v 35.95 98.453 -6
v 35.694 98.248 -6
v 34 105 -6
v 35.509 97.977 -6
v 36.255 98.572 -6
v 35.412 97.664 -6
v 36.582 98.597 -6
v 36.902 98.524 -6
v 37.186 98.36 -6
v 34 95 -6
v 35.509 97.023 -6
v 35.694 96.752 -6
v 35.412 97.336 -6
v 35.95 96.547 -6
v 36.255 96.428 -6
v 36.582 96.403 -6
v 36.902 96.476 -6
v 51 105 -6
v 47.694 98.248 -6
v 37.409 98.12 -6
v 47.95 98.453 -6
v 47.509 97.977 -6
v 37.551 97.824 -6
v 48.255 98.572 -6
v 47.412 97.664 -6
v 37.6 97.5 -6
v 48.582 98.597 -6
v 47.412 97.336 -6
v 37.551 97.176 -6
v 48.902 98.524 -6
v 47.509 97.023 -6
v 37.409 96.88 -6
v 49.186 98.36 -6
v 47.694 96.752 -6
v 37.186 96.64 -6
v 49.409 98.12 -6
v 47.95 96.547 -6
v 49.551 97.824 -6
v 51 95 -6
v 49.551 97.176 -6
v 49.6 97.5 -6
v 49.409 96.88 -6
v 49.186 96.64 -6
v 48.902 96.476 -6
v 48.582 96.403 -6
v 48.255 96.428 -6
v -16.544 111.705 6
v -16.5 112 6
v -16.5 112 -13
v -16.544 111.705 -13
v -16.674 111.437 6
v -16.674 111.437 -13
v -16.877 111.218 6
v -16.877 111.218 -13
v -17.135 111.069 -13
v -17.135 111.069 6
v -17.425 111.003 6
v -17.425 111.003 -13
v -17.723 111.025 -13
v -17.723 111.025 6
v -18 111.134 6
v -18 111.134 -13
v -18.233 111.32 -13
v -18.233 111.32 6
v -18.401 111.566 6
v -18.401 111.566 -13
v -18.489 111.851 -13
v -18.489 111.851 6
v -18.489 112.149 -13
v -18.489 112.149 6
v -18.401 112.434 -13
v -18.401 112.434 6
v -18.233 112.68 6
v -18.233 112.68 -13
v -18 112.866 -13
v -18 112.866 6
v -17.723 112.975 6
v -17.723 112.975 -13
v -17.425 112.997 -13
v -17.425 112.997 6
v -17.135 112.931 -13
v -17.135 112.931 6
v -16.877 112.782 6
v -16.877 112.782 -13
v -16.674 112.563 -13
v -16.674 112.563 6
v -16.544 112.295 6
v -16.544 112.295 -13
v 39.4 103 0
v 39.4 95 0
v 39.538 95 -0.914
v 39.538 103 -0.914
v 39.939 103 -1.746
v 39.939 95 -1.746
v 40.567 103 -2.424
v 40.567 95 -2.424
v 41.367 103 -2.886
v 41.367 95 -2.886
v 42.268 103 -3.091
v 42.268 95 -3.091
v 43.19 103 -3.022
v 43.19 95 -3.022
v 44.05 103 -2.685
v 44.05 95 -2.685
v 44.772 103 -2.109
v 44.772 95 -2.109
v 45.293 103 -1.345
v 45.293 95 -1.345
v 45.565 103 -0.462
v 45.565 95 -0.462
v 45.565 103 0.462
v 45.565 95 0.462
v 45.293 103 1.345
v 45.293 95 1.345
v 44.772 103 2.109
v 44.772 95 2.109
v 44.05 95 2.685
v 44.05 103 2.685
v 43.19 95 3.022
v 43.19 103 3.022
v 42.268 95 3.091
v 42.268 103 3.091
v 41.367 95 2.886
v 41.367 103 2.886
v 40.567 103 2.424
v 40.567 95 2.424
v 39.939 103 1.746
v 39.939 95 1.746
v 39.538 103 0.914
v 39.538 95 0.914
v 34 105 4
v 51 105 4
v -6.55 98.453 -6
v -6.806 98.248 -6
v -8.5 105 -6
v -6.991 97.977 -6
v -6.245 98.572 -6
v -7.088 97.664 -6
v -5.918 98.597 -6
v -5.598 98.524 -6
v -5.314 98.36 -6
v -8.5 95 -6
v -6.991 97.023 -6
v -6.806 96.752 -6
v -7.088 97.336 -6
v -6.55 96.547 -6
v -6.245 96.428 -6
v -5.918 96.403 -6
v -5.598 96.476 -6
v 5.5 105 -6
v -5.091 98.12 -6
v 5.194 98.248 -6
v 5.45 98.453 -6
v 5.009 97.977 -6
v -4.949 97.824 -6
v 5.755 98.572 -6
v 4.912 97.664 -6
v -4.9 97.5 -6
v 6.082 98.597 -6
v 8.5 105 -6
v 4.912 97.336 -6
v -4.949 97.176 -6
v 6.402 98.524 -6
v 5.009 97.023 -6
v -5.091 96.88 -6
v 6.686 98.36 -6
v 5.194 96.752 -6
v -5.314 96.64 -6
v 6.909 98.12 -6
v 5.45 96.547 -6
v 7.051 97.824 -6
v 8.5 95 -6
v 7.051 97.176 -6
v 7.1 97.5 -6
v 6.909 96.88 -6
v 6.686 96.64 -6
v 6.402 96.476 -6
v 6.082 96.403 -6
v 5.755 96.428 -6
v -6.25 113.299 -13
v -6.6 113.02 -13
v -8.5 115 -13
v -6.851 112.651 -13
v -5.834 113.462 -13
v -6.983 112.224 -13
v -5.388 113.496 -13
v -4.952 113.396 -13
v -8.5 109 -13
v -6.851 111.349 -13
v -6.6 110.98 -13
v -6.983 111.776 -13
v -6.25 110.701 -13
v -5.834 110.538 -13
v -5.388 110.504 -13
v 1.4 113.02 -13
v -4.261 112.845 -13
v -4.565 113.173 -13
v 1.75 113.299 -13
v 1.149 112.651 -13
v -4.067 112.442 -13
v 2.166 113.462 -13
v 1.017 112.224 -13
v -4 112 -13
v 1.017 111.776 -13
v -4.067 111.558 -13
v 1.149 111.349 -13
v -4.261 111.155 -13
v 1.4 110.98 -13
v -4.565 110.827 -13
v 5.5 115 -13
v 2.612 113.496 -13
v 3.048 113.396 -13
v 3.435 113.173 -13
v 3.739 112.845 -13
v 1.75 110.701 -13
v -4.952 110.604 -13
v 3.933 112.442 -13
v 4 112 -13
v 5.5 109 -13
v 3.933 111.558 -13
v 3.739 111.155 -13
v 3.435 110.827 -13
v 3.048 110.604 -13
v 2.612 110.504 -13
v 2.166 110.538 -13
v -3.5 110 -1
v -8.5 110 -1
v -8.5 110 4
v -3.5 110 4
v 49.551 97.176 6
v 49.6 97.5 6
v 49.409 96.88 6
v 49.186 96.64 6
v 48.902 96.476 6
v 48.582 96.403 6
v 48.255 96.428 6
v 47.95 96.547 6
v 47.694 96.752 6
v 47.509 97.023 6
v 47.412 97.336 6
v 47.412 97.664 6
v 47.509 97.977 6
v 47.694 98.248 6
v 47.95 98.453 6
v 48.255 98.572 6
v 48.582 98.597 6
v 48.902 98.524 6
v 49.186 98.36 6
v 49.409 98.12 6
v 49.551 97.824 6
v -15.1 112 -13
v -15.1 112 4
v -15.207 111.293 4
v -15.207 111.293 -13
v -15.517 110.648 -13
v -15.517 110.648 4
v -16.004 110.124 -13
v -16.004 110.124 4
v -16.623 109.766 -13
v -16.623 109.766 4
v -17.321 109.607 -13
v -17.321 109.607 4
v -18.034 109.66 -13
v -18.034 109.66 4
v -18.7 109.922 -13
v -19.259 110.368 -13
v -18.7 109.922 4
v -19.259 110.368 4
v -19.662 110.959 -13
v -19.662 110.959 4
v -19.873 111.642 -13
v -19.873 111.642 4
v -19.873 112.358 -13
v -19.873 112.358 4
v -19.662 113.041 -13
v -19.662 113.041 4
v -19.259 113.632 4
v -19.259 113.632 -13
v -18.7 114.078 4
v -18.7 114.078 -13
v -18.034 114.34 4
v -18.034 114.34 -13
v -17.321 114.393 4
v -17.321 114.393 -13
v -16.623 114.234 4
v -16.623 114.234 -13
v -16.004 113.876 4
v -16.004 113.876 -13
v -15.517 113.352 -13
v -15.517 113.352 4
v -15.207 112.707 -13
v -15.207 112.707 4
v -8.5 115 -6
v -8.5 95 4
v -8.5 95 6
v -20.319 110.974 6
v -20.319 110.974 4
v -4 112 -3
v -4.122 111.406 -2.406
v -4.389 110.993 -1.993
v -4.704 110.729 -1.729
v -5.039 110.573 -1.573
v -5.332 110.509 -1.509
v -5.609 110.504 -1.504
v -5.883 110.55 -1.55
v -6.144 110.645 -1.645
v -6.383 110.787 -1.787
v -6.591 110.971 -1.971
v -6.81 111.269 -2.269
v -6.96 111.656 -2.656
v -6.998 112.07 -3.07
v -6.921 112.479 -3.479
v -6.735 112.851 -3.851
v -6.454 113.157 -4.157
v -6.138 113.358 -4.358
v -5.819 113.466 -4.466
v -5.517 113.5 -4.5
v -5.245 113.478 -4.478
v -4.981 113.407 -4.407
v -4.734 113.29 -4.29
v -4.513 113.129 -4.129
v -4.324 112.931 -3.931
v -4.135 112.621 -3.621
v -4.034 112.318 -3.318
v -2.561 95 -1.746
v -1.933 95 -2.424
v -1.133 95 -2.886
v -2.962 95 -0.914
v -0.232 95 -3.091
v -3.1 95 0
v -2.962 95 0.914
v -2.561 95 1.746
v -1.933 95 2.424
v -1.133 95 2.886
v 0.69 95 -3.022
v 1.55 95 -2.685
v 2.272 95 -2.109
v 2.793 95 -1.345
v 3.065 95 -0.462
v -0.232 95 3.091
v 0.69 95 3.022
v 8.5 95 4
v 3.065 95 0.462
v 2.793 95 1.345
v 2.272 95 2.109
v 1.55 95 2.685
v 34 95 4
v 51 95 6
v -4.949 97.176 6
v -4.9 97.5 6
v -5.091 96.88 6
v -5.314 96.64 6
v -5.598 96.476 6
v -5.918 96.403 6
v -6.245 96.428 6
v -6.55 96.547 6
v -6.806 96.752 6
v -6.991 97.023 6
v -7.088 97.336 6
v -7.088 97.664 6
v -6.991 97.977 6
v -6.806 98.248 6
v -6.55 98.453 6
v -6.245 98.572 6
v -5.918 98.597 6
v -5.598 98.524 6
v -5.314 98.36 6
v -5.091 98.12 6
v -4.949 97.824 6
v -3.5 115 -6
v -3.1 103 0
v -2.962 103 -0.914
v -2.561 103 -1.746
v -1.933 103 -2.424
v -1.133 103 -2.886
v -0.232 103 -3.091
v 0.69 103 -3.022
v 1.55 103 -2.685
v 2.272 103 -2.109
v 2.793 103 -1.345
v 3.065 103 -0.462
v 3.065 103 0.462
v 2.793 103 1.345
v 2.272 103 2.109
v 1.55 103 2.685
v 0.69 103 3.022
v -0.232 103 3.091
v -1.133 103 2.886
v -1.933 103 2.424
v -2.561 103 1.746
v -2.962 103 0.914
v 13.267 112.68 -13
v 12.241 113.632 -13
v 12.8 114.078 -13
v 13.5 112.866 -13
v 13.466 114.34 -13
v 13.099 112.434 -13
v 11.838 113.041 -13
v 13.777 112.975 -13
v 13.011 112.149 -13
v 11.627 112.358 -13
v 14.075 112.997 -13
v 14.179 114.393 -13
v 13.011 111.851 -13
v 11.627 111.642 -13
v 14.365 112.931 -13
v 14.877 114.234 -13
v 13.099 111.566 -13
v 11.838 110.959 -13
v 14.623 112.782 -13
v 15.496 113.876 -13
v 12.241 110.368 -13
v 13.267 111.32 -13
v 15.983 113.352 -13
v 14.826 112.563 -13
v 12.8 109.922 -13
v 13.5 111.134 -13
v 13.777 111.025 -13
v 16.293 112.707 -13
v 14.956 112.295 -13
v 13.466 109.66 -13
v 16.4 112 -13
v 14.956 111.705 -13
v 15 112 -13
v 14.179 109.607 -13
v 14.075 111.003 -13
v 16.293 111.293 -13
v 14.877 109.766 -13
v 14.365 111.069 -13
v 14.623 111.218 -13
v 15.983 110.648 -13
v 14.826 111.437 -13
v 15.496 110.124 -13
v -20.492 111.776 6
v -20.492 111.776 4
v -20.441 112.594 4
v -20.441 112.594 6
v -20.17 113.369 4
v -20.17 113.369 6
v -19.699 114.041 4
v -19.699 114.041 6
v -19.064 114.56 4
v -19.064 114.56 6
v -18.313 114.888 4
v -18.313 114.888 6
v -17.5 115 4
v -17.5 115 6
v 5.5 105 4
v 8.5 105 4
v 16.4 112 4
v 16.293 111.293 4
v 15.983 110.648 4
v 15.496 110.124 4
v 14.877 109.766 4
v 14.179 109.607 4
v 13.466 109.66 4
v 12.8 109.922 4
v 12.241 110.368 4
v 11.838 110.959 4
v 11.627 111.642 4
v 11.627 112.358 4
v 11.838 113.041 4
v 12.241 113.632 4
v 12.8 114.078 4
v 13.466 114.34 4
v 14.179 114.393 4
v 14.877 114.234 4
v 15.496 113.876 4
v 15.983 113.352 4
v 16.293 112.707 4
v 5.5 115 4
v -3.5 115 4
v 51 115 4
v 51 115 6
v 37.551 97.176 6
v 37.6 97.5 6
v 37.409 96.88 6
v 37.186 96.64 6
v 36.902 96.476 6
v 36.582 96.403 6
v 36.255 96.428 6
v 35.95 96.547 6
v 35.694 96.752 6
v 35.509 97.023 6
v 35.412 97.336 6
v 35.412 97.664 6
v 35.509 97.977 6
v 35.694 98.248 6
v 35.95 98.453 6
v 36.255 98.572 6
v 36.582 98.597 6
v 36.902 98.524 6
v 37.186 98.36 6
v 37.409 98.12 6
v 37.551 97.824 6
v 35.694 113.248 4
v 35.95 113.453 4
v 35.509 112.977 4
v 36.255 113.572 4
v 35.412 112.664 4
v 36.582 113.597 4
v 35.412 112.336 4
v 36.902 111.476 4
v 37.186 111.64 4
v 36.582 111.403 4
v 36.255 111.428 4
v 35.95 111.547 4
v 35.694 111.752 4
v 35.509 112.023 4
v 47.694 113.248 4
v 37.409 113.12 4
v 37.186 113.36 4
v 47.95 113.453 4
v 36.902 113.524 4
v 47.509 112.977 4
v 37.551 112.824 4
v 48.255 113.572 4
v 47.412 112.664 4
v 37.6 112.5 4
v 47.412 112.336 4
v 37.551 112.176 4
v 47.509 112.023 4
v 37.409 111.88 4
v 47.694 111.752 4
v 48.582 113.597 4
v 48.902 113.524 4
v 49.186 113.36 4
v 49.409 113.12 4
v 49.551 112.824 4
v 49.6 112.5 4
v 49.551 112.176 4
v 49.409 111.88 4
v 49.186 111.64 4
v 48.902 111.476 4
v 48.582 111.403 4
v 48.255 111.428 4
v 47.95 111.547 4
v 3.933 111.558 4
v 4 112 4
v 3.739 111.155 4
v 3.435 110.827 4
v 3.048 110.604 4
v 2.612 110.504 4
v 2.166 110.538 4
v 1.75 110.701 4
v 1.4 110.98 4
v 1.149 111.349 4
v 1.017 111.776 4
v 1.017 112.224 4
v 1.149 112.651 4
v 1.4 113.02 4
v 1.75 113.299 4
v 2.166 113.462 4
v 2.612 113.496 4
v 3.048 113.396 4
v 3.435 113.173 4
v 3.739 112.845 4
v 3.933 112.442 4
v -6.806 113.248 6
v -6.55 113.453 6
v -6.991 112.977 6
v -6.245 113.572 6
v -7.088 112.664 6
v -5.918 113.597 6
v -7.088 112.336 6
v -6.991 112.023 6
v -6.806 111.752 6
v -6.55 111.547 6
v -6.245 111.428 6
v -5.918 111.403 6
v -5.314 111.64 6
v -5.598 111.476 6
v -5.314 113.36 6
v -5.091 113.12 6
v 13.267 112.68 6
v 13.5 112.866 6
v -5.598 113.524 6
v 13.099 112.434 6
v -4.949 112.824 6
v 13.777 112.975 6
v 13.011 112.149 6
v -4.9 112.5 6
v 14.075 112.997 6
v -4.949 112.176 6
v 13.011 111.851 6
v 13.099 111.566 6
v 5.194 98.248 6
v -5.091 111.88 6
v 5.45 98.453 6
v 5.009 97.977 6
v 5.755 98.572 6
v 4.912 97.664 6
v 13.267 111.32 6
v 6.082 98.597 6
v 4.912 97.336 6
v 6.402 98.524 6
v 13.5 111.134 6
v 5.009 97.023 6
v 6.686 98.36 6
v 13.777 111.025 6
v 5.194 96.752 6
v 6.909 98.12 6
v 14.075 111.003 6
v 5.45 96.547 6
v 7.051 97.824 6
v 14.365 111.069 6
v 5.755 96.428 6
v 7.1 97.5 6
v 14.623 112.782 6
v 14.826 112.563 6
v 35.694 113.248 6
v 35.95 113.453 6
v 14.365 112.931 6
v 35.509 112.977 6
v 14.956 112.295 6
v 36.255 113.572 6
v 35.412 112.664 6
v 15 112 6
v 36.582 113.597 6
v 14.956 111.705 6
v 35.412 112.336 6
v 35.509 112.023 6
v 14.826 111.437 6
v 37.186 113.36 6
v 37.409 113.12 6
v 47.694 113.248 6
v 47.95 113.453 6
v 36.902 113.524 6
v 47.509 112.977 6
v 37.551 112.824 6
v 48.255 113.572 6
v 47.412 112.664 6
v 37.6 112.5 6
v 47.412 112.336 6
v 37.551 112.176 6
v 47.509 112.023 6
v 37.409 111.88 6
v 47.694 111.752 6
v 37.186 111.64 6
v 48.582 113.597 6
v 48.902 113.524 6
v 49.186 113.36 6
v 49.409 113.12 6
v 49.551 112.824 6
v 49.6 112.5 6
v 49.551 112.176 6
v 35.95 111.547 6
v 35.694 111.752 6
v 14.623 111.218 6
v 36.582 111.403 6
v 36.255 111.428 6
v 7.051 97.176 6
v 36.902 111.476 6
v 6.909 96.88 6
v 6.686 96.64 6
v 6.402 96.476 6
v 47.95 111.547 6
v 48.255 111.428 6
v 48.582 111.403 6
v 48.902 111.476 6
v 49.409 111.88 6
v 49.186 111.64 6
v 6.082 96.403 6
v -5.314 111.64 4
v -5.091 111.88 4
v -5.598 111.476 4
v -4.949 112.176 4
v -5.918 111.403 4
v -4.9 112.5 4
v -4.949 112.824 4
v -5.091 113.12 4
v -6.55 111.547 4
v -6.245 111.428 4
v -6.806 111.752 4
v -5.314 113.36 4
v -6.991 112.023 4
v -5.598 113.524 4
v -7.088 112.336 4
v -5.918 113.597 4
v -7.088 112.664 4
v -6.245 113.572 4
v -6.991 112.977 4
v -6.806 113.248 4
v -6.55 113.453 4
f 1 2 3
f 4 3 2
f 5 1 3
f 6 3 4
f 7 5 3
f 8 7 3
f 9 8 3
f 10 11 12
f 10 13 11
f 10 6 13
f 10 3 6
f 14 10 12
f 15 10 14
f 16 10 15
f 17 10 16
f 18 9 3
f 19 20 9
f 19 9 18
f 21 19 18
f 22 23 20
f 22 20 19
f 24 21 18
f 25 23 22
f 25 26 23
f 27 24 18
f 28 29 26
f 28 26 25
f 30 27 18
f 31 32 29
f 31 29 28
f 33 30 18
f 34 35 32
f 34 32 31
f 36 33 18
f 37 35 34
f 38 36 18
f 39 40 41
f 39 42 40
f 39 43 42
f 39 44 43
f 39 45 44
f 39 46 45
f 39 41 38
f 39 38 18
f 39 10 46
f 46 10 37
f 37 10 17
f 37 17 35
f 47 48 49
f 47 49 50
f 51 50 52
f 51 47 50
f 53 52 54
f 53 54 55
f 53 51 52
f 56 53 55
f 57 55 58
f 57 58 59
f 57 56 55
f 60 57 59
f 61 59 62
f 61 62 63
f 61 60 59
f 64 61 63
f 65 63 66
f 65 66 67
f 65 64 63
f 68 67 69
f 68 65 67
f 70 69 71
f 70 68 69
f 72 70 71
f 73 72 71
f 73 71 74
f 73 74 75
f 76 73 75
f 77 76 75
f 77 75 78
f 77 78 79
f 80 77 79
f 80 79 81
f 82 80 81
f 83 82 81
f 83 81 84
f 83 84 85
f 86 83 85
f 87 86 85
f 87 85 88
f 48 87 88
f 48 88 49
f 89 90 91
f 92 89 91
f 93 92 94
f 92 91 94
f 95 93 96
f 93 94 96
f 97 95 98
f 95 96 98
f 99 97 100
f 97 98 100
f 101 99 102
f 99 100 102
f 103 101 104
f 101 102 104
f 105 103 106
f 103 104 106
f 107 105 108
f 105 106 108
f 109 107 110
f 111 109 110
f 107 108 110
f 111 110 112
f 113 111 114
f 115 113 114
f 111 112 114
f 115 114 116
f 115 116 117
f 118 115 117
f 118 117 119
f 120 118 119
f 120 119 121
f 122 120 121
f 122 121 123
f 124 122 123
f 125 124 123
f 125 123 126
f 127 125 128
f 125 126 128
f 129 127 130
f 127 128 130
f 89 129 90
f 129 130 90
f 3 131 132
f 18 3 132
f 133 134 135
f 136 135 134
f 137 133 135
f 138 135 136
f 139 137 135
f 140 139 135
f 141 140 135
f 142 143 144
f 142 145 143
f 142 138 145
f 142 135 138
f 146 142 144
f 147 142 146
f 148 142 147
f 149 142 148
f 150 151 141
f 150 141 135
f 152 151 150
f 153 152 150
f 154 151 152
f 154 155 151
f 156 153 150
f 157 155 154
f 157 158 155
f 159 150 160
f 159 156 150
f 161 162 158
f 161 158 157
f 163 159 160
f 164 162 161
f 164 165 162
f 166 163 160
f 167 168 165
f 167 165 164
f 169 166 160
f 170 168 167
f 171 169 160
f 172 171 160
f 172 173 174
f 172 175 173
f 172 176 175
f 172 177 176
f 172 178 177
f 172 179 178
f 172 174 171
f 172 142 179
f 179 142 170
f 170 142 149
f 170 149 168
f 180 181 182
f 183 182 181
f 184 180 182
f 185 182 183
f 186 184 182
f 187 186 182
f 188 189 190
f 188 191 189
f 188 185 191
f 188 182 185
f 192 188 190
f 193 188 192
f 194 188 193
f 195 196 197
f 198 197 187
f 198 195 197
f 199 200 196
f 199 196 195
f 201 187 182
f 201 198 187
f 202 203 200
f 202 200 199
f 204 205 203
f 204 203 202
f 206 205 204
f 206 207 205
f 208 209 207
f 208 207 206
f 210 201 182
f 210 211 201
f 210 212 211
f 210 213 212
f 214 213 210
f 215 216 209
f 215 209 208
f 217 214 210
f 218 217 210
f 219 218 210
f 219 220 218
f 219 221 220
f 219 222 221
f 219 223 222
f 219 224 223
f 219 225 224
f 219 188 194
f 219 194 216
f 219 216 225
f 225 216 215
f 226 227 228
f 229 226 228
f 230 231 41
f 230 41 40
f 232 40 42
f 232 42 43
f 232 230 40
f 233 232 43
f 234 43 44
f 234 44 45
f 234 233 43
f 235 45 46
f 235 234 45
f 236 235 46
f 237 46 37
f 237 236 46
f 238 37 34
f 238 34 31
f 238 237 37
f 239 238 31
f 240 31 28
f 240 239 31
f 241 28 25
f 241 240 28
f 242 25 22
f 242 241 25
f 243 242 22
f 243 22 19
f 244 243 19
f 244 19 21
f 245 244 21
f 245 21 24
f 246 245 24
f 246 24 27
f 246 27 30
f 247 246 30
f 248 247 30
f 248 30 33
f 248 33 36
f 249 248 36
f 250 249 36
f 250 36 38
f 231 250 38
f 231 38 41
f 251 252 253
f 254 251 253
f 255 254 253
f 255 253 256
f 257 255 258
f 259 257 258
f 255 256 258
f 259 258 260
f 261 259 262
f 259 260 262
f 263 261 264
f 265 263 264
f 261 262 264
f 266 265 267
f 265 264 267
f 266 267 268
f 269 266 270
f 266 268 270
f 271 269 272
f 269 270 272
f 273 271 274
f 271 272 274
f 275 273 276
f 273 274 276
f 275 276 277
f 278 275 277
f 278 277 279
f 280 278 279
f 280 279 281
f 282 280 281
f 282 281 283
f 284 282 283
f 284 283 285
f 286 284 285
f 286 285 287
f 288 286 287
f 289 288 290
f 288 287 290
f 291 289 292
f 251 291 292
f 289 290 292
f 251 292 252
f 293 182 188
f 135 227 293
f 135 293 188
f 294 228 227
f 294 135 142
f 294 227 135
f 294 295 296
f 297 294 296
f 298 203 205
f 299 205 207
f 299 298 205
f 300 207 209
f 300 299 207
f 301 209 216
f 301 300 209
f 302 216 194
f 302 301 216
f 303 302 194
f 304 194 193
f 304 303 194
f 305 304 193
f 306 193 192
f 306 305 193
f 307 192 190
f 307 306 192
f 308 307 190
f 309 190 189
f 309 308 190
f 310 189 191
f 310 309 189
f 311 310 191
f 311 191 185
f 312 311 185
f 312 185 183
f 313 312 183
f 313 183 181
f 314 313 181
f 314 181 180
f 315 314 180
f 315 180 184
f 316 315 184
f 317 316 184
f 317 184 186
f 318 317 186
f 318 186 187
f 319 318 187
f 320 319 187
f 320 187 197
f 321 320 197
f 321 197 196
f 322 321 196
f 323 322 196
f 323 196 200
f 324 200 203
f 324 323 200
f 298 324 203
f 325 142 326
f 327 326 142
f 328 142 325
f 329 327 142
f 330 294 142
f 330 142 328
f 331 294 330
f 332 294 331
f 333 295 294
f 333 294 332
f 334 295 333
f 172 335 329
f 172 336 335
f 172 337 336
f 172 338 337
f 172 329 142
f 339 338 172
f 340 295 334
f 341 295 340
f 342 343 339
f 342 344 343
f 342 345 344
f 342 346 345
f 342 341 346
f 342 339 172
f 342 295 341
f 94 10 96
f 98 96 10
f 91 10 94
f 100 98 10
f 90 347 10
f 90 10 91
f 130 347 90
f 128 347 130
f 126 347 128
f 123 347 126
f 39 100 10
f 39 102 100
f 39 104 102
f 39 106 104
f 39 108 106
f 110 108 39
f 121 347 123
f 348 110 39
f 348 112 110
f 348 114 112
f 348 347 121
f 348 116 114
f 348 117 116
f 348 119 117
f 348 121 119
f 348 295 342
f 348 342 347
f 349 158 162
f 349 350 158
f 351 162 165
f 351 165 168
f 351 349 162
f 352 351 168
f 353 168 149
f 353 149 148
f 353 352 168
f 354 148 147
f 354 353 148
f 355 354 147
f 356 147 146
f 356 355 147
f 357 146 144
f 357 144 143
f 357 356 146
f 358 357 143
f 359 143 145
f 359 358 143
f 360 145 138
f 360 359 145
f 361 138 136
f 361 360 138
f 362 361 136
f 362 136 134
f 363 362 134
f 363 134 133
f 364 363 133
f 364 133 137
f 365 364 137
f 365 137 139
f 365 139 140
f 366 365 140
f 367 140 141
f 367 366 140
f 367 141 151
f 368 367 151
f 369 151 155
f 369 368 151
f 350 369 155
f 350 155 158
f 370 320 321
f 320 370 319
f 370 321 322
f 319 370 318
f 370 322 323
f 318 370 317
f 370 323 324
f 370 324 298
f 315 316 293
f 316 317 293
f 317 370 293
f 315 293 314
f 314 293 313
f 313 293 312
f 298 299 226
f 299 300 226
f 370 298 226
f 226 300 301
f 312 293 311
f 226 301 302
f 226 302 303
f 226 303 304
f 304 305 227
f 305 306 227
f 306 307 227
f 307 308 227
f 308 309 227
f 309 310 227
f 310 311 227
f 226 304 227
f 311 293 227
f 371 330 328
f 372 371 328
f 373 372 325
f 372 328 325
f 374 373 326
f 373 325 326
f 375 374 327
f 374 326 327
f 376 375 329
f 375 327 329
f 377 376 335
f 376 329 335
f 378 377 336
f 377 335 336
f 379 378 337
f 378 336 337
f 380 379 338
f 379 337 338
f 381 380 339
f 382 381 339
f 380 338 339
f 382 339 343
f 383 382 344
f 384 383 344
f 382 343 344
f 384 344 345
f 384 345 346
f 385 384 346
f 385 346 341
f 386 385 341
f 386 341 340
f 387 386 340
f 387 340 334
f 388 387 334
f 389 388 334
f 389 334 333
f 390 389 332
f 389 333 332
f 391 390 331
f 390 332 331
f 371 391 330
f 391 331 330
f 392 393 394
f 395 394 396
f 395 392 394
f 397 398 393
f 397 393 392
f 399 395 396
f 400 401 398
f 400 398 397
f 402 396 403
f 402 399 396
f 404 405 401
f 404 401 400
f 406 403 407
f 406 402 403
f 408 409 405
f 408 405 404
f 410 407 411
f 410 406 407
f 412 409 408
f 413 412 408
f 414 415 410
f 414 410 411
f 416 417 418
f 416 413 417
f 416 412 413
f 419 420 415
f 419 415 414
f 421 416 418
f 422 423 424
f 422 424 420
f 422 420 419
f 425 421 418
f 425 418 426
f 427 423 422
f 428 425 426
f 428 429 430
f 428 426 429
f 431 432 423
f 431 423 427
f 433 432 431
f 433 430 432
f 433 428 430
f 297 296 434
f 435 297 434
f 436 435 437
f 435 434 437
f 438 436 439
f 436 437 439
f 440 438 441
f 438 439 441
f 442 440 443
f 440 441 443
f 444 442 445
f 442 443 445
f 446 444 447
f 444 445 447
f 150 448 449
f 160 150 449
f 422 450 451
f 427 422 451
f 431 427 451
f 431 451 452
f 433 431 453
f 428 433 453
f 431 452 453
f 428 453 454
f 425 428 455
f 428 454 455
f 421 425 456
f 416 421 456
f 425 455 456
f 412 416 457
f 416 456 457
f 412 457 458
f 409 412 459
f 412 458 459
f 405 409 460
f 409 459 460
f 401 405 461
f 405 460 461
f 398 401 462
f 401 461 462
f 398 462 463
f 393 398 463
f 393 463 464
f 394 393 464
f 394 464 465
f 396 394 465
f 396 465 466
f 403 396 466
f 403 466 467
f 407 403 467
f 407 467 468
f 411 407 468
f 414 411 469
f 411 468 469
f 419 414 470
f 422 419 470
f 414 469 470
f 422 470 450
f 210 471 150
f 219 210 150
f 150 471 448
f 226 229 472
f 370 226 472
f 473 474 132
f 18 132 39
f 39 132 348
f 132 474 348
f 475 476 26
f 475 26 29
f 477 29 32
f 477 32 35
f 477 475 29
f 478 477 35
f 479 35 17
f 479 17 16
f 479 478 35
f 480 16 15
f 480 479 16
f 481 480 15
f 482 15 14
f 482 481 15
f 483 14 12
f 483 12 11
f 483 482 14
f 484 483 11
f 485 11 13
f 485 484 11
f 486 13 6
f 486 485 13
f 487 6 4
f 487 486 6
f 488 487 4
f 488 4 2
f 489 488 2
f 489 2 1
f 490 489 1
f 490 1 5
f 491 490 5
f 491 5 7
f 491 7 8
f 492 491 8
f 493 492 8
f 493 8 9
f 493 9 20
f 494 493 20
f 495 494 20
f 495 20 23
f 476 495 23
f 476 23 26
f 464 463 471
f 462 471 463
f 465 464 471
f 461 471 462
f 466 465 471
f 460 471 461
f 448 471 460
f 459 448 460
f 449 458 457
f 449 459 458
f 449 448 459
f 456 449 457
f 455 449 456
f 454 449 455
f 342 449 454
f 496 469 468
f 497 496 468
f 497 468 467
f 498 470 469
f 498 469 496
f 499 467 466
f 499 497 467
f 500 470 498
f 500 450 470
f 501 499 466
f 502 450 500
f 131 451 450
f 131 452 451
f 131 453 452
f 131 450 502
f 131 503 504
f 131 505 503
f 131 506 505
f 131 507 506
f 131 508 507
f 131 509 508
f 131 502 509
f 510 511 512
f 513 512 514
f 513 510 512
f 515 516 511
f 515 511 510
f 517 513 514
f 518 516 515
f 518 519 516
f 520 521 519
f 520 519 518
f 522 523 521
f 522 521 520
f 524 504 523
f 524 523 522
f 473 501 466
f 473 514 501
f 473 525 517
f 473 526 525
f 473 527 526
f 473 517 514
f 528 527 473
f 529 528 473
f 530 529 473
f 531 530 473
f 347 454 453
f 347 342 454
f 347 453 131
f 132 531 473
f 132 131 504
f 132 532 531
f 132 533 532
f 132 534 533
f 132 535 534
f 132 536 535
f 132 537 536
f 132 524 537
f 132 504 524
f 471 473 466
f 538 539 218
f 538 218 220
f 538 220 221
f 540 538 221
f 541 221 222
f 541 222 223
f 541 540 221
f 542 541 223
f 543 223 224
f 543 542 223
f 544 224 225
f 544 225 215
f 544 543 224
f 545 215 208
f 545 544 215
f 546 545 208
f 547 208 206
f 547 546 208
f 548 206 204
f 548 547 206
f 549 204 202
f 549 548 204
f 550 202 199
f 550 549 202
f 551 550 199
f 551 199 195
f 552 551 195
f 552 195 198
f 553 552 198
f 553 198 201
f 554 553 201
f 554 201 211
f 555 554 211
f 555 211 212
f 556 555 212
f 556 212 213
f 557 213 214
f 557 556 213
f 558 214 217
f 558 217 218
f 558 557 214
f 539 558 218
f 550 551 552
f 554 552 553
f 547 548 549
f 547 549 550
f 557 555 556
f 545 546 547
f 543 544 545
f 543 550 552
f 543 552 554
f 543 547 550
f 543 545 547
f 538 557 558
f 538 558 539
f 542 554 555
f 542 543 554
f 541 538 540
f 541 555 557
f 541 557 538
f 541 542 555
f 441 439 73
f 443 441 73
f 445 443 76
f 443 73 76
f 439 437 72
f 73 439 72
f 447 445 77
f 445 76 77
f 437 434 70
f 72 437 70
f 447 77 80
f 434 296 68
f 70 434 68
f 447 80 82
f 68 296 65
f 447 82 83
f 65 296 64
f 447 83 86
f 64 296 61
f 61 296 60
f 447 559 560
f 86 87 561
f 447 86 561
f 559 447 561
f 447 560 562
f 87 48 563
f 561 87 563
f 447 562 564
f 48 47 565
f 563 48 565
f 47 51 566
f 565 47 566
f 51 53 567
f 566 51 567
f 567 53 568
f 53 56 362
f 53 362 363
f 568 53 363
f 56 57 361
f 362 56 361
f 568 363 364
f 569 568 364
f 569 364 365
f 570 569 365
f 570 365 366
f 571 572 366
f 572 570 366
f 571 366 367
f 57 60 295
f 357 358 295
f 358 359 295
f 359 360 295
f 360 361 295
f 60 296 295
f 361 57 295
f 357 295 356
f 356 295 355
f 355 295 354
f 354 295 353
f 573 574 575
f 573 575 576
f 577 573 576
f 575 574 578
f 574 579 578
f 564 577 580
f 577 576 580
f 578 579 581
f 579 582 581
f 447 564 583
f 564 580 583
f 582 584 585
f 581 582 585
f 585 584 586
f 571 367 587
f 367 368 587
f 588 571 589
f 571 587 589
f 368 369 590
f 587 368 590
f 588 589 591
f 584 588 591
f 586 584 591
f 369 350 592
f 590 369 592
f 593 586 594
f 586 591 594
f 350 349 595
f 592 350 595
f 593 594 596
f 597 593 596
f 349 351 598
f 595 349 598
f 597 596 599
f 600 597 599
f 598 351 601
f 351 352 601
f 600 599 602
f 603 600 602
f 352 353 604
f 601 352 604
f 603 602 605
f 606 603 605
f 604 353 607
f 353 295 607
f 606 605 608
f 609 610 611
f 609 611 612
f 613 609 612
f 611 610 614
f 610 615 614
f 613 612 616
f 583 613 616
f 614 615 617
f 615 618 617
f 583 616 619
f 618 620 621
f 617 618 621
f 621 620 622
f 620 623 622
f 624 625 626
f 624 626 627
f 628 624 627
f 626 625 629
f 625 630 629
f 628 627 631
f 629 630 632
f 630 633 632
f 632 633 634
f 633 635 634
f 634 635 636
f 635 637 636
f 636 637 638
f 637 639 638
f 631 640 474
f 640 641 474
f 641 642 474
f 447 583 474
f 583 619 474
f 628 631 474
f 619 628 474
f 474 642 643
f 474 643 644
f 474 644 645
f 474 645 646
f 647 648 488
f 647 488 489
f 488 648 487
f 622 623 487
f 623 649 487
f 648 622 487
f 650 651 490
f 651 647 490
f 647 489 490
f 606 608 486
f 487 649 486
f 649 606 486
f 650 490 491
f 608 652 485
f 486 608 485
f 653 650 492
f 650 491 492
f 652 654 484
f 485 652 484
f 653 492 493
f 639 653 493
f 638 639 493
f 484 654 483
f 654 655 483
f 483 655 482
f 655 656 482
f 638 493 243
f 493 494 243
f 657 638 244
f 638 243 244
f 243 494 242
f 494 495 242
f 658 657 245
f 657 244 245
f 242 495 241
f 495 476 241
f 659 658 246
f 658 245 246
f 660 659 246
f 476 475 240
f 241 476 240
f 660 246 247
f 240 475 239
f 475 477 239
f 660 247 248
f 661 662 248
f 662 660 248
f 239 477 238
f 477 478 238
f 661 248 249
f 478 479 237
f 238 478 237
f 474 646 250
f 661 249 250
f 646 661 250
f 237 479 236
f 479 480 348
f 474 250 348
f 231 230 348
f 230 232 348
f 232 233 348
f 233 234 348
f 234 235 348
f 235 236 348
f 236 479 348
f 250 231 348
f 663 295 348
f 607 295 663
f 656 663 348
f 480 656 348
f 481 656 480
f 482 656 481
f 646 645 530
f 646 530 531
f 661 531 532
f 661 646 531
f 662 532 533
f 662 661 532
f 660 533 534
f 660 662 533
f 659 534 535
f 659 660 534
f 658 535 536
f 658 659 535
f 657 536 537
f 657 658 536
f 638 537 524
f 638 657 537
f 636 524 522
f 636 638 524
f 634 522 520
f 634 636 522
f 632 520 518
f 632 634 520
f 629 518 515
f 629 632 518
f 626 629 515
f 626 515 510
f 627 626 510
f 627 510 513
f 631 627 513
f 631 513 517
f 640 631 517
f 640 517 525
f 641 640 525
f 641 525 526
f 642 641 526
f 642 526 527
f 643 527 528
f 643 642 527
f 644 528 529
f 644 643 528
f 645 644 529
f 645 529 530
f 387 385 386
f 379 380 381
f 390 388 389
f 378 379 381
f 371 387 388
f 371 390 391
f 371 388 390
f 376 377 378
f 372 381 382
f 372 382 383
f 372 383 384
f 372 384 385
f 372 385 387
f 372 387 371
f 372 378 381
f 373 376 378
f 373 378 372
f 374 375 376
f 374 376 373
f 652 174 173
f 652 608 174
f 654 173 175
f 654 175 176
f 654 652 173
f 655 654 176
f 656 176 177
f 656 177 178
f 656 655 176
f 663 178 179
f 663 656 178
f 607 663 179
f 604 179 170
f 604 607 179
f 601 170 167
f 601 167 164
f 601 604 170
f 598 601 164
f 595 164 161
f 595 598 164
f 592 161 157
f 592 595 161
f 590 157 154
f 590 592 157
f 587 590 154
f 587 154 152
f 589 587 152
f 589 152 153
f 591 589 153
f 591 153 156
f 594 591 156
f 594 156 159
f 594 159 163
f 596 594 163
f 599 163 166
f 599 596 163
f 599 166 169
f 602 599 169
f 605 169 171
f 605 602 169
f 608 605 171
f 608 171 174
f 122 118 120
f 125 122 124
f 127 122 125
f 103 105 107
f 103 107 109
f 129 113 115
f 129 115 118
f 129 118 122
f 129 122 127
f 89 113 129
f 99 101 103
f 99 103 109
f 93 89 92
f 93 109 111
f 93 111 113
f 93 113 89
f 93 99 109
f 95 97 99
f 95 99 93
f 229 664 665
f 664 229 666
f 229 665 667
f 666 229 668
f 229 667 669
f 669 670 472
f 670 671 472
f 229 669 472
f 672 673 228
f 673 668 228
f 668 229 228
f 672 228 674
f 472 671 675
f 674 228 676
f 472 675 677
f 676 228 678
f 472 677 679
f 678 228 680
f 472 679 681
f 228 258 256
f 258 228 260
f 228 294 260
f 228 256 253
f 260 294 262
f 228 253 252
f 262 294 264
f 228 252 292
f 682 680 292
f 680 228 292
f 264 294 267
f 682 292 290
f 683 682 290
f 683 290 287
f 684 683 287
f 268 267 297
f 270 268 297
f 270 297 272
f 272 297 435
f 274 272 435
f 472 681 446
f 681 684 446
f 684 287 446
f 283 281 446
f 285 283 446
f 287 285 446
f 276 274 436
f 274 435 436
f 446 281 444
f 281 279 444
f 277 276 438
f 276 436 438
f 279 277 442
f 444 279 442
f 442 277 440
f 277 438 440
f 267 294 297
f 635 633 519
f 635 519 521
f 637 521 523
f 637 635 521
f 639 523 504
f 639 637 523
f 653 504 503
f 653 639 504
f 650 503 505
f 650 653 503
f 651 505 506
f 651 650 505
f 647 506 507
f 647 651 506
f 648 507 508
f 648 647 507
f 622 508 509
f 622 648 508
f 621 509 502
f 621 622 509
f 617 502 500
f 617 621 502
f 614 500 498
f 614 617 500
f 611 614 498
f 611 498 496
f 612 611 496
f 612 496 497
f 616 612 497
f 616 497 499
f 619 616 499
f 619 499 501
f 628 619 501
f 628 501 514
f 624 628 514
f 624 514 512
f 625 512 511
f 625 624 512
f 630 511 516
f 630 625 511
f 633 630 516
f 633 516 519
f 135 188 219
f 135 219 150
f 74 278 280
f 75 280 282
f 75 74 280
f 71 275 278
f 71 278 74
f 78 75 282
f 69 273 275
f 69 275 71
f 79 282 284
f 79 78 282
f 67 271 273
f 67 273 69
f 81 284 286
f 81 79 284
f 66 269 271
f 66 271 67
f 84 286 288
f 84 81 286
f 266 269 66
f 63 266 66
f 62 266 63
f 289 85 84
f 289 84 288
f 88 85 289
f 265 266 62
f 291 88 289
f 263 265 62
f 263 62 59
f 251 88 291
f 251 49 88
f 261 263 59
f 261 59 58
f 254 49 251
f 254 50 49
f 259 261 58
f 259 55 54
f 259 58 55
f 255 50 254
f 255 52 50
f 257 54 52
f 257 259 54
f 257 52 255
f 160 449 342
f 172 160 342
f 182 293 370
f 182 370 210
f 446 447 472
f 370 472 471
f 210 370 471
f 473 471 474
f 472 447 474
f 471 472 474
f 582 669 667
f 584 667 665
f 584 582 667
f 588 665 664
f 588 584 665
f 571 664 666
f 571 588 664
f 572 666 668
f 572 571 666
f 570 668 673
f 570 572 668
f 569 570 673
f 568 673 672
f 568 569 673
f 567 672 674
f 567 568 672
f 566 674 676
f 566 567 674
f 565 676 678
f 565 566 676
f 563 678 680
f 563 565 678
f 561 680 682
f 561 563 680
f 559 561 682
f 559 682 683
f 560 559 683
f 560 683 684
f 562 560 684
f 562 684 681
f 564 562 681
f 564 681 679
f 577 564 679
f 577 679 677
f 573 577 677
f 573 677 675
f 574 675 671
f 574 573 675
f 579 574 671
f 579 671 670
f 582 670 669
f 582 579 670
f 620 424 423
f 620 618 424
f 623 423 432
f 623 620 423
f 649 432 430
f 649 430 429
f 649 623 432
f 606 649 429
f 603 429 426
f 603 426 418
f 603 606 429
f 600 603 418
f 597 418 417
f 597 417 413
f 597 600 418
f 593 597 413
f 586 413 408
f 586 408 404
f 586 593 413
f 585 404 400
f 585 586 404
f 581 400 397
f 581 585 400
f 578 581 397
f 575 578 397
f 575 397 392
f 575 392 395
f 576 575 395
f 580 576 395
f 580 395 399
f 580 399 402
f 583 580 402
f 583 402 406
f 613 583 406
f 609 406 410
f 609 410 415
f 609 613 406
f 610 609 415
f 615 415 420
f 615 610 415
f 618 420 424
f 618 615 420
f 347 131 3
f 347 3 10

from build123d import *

# Parameters (mm, degrees)
SKETCH056_R     = 1.1
SKETCH056_R_2   = 1
PAD026_DEPTH    = 2
SKETCH072_W     = 17
SKETCH072_H     = 10
SKETCH072_R     = 1.1
PAD031_DEPTH    = 10
SKETCH073_R     = 2.4
SKETCH073_R_2   = 1
SKETCH073_W     = 14
SKETCH073_H     = 10
SKETCH073_R_3   = 1.5
PAD032_DEPTH    = 17
POCKET035_DEPTH = 14
POCKET036_DEPTH = 5
SKETCH076_R     = 3.1
POCKET037_DEPTH = 8


with BuildPart() as part:
    # Sketch056 → Pad026 (new body)
    with BuildSketch(Plane(origin=(-8.5, 115, 6), x_dir=(1, 0, 0), z_dir=(0, 0, -1))):
        with BuildLine():
            Line((0, 0), (59.5, 0))
            Line((59.5, 0), (59.5, 20))
            Line((59.5, 20), (0, 20))
            Line((0, 20), (-11.819078, 4.02606))
            ThreePointArc((-11.819078, 4.02606), (-11.457456, 1.279271), (-9, 0))
            Line((0, 0), (-9, 0))
        make_face()
        with Locations((2.5, 17.5)):
            Circle(SKETCH056_R, mode=Mode.SUBTRACT)
        with Locations((14.5, 17.5)):
            Circle(SKETCH056_R, mode=Mode.SUBTRACT)
        with Locations((45, 17.5)):
            Circle(SKETCH056_R, mode=Mode.SUBTRACT)
        with Locations((45, 2.5)):
            Circle(SKETCH056_R, mode=Mode.SUBTRACT)
        with Locations((57, 17.5)):
            Circle(SKETCH056_R, mode=Mode.SUBTRACT)
        with Locations((57, 2.5)):
            Circle(SKETCH056_R, mode=Mode.SUBTRACT)
        with Locations((2.5, 2.5)):
            Circle(SKETCH056_R, mode=Mode.SUBTRACT)
        with Locations((22.5, 3)):
            Circle(SKETCH056_R_2, mode=Mode.SUBTRACT)
        with Locations((-9, 3)):
            Circle(SKETCH056_R_2, mode=Mode.SUBTRACT)
    extrude(amount=PAD026_DEPTH)

    # Sketch072 → Pad031 (new body)
    with BuildSketch(Plane(origin=(-8.5, 115, 4), x_dir=(1, 0, 0), z_dir=(0, 0, -1))):
        with Locations((8.5, 15)):
            Rectangle(SKETCH072_W, SKETCH072_H)
        with Locations((2.5, 17.5)):
            Circle(SKETCH072_R, mode=Mode.SUBTRACT)
        with Locations((14.5, 17.5)):
            Circle(SKETCH072_R, mode=Mode.SUBTRACT)
        with Locations((51, 15)):
            Rectangle(SKETCH072_W, SKETCH072_H)
        with Locations((45, 17.5)):
            Circle(SKETCH072_R, mode=Mode.SUBTRACT)
        with Locations((57, 17.5)):
            Circle(SKETCH072_R, mode=Mode.SUBTRACT)
    extrude(amount=PAD031_DEPTH)

    # Sketch073 → Pad032 (new body)
    with BuildSketch(Plane(origin=(-8.5, 115, 4), x_dir=(1, 0, 0), z_dir=(0, 0, -1))):
        with Locations((22.5, 3)):
            Circle(SKETCH073_R)
        with Locations((22.5, 3)):
            Circle(SKETCH073_R_2, mode=Mode.SUBTRACT)
        with Locations((-9, 3)):
            Circle(SKETCH073_R)
        with Locations((-9, 3)):
            Circle(SKETCH073_R_2, mode=Mode.SUBTRACT)
        with Locations((7, 5)):
            Rectangle(SKETCH073_W, SKETCH073_H)
        with Locations((11, 3)):
            Circle(SKETCH073_R_3, mode=Mode.SUBTRACT)
        with Locations((3, 3)):
            Circle(SKETCH073_R_3, mode=Mode.SUBTRACT)
    extrude(amount=PAD032_DEPTH)

    # Sketch074 → Pocket035 (cut)
    with BuildSketch(Plane(origin=(-8.5, 115, 6), x_dir=(0, 1, 0), z_dir=(-1, 0, 0))):
        Polygon((-10, 12), (-10, 19), (-6, 19), align=None)
    extrude(amount=-POCKET035_DEPTH, mode=Mode.SUBTRACT)

    # Sketch075 → Pocket036 (cut)
    with BuildSketch(Plane(origin=(-8.5, 115, 6), x_dir=(0, 1, 0), z_dir=(-1, 0, 0))):
        Polygon((0, 2), (0, 12), (-5, 7), (-5, 2), align=None)
    extrude(amount=-POCKET036_DEPTH, mode=Mode.SUBTRACT)

    # Sketch076 → Pocket037 (cut)
    with BuildSketch(Plane(origin=(-8.5, 95, 6), x_dir=(-1, 0, 0), z_dir=(0, -1, 0))):
        with Locations((-8.5, 6)):
            Circle(SKETCH076_R)
        with Locations((-51, 6)):
            Circle(SKETCH076_R)
    extrude(amount=-POCKET037_DEPTH, mode=Mode.SUBTRACT)


solid = part.part
